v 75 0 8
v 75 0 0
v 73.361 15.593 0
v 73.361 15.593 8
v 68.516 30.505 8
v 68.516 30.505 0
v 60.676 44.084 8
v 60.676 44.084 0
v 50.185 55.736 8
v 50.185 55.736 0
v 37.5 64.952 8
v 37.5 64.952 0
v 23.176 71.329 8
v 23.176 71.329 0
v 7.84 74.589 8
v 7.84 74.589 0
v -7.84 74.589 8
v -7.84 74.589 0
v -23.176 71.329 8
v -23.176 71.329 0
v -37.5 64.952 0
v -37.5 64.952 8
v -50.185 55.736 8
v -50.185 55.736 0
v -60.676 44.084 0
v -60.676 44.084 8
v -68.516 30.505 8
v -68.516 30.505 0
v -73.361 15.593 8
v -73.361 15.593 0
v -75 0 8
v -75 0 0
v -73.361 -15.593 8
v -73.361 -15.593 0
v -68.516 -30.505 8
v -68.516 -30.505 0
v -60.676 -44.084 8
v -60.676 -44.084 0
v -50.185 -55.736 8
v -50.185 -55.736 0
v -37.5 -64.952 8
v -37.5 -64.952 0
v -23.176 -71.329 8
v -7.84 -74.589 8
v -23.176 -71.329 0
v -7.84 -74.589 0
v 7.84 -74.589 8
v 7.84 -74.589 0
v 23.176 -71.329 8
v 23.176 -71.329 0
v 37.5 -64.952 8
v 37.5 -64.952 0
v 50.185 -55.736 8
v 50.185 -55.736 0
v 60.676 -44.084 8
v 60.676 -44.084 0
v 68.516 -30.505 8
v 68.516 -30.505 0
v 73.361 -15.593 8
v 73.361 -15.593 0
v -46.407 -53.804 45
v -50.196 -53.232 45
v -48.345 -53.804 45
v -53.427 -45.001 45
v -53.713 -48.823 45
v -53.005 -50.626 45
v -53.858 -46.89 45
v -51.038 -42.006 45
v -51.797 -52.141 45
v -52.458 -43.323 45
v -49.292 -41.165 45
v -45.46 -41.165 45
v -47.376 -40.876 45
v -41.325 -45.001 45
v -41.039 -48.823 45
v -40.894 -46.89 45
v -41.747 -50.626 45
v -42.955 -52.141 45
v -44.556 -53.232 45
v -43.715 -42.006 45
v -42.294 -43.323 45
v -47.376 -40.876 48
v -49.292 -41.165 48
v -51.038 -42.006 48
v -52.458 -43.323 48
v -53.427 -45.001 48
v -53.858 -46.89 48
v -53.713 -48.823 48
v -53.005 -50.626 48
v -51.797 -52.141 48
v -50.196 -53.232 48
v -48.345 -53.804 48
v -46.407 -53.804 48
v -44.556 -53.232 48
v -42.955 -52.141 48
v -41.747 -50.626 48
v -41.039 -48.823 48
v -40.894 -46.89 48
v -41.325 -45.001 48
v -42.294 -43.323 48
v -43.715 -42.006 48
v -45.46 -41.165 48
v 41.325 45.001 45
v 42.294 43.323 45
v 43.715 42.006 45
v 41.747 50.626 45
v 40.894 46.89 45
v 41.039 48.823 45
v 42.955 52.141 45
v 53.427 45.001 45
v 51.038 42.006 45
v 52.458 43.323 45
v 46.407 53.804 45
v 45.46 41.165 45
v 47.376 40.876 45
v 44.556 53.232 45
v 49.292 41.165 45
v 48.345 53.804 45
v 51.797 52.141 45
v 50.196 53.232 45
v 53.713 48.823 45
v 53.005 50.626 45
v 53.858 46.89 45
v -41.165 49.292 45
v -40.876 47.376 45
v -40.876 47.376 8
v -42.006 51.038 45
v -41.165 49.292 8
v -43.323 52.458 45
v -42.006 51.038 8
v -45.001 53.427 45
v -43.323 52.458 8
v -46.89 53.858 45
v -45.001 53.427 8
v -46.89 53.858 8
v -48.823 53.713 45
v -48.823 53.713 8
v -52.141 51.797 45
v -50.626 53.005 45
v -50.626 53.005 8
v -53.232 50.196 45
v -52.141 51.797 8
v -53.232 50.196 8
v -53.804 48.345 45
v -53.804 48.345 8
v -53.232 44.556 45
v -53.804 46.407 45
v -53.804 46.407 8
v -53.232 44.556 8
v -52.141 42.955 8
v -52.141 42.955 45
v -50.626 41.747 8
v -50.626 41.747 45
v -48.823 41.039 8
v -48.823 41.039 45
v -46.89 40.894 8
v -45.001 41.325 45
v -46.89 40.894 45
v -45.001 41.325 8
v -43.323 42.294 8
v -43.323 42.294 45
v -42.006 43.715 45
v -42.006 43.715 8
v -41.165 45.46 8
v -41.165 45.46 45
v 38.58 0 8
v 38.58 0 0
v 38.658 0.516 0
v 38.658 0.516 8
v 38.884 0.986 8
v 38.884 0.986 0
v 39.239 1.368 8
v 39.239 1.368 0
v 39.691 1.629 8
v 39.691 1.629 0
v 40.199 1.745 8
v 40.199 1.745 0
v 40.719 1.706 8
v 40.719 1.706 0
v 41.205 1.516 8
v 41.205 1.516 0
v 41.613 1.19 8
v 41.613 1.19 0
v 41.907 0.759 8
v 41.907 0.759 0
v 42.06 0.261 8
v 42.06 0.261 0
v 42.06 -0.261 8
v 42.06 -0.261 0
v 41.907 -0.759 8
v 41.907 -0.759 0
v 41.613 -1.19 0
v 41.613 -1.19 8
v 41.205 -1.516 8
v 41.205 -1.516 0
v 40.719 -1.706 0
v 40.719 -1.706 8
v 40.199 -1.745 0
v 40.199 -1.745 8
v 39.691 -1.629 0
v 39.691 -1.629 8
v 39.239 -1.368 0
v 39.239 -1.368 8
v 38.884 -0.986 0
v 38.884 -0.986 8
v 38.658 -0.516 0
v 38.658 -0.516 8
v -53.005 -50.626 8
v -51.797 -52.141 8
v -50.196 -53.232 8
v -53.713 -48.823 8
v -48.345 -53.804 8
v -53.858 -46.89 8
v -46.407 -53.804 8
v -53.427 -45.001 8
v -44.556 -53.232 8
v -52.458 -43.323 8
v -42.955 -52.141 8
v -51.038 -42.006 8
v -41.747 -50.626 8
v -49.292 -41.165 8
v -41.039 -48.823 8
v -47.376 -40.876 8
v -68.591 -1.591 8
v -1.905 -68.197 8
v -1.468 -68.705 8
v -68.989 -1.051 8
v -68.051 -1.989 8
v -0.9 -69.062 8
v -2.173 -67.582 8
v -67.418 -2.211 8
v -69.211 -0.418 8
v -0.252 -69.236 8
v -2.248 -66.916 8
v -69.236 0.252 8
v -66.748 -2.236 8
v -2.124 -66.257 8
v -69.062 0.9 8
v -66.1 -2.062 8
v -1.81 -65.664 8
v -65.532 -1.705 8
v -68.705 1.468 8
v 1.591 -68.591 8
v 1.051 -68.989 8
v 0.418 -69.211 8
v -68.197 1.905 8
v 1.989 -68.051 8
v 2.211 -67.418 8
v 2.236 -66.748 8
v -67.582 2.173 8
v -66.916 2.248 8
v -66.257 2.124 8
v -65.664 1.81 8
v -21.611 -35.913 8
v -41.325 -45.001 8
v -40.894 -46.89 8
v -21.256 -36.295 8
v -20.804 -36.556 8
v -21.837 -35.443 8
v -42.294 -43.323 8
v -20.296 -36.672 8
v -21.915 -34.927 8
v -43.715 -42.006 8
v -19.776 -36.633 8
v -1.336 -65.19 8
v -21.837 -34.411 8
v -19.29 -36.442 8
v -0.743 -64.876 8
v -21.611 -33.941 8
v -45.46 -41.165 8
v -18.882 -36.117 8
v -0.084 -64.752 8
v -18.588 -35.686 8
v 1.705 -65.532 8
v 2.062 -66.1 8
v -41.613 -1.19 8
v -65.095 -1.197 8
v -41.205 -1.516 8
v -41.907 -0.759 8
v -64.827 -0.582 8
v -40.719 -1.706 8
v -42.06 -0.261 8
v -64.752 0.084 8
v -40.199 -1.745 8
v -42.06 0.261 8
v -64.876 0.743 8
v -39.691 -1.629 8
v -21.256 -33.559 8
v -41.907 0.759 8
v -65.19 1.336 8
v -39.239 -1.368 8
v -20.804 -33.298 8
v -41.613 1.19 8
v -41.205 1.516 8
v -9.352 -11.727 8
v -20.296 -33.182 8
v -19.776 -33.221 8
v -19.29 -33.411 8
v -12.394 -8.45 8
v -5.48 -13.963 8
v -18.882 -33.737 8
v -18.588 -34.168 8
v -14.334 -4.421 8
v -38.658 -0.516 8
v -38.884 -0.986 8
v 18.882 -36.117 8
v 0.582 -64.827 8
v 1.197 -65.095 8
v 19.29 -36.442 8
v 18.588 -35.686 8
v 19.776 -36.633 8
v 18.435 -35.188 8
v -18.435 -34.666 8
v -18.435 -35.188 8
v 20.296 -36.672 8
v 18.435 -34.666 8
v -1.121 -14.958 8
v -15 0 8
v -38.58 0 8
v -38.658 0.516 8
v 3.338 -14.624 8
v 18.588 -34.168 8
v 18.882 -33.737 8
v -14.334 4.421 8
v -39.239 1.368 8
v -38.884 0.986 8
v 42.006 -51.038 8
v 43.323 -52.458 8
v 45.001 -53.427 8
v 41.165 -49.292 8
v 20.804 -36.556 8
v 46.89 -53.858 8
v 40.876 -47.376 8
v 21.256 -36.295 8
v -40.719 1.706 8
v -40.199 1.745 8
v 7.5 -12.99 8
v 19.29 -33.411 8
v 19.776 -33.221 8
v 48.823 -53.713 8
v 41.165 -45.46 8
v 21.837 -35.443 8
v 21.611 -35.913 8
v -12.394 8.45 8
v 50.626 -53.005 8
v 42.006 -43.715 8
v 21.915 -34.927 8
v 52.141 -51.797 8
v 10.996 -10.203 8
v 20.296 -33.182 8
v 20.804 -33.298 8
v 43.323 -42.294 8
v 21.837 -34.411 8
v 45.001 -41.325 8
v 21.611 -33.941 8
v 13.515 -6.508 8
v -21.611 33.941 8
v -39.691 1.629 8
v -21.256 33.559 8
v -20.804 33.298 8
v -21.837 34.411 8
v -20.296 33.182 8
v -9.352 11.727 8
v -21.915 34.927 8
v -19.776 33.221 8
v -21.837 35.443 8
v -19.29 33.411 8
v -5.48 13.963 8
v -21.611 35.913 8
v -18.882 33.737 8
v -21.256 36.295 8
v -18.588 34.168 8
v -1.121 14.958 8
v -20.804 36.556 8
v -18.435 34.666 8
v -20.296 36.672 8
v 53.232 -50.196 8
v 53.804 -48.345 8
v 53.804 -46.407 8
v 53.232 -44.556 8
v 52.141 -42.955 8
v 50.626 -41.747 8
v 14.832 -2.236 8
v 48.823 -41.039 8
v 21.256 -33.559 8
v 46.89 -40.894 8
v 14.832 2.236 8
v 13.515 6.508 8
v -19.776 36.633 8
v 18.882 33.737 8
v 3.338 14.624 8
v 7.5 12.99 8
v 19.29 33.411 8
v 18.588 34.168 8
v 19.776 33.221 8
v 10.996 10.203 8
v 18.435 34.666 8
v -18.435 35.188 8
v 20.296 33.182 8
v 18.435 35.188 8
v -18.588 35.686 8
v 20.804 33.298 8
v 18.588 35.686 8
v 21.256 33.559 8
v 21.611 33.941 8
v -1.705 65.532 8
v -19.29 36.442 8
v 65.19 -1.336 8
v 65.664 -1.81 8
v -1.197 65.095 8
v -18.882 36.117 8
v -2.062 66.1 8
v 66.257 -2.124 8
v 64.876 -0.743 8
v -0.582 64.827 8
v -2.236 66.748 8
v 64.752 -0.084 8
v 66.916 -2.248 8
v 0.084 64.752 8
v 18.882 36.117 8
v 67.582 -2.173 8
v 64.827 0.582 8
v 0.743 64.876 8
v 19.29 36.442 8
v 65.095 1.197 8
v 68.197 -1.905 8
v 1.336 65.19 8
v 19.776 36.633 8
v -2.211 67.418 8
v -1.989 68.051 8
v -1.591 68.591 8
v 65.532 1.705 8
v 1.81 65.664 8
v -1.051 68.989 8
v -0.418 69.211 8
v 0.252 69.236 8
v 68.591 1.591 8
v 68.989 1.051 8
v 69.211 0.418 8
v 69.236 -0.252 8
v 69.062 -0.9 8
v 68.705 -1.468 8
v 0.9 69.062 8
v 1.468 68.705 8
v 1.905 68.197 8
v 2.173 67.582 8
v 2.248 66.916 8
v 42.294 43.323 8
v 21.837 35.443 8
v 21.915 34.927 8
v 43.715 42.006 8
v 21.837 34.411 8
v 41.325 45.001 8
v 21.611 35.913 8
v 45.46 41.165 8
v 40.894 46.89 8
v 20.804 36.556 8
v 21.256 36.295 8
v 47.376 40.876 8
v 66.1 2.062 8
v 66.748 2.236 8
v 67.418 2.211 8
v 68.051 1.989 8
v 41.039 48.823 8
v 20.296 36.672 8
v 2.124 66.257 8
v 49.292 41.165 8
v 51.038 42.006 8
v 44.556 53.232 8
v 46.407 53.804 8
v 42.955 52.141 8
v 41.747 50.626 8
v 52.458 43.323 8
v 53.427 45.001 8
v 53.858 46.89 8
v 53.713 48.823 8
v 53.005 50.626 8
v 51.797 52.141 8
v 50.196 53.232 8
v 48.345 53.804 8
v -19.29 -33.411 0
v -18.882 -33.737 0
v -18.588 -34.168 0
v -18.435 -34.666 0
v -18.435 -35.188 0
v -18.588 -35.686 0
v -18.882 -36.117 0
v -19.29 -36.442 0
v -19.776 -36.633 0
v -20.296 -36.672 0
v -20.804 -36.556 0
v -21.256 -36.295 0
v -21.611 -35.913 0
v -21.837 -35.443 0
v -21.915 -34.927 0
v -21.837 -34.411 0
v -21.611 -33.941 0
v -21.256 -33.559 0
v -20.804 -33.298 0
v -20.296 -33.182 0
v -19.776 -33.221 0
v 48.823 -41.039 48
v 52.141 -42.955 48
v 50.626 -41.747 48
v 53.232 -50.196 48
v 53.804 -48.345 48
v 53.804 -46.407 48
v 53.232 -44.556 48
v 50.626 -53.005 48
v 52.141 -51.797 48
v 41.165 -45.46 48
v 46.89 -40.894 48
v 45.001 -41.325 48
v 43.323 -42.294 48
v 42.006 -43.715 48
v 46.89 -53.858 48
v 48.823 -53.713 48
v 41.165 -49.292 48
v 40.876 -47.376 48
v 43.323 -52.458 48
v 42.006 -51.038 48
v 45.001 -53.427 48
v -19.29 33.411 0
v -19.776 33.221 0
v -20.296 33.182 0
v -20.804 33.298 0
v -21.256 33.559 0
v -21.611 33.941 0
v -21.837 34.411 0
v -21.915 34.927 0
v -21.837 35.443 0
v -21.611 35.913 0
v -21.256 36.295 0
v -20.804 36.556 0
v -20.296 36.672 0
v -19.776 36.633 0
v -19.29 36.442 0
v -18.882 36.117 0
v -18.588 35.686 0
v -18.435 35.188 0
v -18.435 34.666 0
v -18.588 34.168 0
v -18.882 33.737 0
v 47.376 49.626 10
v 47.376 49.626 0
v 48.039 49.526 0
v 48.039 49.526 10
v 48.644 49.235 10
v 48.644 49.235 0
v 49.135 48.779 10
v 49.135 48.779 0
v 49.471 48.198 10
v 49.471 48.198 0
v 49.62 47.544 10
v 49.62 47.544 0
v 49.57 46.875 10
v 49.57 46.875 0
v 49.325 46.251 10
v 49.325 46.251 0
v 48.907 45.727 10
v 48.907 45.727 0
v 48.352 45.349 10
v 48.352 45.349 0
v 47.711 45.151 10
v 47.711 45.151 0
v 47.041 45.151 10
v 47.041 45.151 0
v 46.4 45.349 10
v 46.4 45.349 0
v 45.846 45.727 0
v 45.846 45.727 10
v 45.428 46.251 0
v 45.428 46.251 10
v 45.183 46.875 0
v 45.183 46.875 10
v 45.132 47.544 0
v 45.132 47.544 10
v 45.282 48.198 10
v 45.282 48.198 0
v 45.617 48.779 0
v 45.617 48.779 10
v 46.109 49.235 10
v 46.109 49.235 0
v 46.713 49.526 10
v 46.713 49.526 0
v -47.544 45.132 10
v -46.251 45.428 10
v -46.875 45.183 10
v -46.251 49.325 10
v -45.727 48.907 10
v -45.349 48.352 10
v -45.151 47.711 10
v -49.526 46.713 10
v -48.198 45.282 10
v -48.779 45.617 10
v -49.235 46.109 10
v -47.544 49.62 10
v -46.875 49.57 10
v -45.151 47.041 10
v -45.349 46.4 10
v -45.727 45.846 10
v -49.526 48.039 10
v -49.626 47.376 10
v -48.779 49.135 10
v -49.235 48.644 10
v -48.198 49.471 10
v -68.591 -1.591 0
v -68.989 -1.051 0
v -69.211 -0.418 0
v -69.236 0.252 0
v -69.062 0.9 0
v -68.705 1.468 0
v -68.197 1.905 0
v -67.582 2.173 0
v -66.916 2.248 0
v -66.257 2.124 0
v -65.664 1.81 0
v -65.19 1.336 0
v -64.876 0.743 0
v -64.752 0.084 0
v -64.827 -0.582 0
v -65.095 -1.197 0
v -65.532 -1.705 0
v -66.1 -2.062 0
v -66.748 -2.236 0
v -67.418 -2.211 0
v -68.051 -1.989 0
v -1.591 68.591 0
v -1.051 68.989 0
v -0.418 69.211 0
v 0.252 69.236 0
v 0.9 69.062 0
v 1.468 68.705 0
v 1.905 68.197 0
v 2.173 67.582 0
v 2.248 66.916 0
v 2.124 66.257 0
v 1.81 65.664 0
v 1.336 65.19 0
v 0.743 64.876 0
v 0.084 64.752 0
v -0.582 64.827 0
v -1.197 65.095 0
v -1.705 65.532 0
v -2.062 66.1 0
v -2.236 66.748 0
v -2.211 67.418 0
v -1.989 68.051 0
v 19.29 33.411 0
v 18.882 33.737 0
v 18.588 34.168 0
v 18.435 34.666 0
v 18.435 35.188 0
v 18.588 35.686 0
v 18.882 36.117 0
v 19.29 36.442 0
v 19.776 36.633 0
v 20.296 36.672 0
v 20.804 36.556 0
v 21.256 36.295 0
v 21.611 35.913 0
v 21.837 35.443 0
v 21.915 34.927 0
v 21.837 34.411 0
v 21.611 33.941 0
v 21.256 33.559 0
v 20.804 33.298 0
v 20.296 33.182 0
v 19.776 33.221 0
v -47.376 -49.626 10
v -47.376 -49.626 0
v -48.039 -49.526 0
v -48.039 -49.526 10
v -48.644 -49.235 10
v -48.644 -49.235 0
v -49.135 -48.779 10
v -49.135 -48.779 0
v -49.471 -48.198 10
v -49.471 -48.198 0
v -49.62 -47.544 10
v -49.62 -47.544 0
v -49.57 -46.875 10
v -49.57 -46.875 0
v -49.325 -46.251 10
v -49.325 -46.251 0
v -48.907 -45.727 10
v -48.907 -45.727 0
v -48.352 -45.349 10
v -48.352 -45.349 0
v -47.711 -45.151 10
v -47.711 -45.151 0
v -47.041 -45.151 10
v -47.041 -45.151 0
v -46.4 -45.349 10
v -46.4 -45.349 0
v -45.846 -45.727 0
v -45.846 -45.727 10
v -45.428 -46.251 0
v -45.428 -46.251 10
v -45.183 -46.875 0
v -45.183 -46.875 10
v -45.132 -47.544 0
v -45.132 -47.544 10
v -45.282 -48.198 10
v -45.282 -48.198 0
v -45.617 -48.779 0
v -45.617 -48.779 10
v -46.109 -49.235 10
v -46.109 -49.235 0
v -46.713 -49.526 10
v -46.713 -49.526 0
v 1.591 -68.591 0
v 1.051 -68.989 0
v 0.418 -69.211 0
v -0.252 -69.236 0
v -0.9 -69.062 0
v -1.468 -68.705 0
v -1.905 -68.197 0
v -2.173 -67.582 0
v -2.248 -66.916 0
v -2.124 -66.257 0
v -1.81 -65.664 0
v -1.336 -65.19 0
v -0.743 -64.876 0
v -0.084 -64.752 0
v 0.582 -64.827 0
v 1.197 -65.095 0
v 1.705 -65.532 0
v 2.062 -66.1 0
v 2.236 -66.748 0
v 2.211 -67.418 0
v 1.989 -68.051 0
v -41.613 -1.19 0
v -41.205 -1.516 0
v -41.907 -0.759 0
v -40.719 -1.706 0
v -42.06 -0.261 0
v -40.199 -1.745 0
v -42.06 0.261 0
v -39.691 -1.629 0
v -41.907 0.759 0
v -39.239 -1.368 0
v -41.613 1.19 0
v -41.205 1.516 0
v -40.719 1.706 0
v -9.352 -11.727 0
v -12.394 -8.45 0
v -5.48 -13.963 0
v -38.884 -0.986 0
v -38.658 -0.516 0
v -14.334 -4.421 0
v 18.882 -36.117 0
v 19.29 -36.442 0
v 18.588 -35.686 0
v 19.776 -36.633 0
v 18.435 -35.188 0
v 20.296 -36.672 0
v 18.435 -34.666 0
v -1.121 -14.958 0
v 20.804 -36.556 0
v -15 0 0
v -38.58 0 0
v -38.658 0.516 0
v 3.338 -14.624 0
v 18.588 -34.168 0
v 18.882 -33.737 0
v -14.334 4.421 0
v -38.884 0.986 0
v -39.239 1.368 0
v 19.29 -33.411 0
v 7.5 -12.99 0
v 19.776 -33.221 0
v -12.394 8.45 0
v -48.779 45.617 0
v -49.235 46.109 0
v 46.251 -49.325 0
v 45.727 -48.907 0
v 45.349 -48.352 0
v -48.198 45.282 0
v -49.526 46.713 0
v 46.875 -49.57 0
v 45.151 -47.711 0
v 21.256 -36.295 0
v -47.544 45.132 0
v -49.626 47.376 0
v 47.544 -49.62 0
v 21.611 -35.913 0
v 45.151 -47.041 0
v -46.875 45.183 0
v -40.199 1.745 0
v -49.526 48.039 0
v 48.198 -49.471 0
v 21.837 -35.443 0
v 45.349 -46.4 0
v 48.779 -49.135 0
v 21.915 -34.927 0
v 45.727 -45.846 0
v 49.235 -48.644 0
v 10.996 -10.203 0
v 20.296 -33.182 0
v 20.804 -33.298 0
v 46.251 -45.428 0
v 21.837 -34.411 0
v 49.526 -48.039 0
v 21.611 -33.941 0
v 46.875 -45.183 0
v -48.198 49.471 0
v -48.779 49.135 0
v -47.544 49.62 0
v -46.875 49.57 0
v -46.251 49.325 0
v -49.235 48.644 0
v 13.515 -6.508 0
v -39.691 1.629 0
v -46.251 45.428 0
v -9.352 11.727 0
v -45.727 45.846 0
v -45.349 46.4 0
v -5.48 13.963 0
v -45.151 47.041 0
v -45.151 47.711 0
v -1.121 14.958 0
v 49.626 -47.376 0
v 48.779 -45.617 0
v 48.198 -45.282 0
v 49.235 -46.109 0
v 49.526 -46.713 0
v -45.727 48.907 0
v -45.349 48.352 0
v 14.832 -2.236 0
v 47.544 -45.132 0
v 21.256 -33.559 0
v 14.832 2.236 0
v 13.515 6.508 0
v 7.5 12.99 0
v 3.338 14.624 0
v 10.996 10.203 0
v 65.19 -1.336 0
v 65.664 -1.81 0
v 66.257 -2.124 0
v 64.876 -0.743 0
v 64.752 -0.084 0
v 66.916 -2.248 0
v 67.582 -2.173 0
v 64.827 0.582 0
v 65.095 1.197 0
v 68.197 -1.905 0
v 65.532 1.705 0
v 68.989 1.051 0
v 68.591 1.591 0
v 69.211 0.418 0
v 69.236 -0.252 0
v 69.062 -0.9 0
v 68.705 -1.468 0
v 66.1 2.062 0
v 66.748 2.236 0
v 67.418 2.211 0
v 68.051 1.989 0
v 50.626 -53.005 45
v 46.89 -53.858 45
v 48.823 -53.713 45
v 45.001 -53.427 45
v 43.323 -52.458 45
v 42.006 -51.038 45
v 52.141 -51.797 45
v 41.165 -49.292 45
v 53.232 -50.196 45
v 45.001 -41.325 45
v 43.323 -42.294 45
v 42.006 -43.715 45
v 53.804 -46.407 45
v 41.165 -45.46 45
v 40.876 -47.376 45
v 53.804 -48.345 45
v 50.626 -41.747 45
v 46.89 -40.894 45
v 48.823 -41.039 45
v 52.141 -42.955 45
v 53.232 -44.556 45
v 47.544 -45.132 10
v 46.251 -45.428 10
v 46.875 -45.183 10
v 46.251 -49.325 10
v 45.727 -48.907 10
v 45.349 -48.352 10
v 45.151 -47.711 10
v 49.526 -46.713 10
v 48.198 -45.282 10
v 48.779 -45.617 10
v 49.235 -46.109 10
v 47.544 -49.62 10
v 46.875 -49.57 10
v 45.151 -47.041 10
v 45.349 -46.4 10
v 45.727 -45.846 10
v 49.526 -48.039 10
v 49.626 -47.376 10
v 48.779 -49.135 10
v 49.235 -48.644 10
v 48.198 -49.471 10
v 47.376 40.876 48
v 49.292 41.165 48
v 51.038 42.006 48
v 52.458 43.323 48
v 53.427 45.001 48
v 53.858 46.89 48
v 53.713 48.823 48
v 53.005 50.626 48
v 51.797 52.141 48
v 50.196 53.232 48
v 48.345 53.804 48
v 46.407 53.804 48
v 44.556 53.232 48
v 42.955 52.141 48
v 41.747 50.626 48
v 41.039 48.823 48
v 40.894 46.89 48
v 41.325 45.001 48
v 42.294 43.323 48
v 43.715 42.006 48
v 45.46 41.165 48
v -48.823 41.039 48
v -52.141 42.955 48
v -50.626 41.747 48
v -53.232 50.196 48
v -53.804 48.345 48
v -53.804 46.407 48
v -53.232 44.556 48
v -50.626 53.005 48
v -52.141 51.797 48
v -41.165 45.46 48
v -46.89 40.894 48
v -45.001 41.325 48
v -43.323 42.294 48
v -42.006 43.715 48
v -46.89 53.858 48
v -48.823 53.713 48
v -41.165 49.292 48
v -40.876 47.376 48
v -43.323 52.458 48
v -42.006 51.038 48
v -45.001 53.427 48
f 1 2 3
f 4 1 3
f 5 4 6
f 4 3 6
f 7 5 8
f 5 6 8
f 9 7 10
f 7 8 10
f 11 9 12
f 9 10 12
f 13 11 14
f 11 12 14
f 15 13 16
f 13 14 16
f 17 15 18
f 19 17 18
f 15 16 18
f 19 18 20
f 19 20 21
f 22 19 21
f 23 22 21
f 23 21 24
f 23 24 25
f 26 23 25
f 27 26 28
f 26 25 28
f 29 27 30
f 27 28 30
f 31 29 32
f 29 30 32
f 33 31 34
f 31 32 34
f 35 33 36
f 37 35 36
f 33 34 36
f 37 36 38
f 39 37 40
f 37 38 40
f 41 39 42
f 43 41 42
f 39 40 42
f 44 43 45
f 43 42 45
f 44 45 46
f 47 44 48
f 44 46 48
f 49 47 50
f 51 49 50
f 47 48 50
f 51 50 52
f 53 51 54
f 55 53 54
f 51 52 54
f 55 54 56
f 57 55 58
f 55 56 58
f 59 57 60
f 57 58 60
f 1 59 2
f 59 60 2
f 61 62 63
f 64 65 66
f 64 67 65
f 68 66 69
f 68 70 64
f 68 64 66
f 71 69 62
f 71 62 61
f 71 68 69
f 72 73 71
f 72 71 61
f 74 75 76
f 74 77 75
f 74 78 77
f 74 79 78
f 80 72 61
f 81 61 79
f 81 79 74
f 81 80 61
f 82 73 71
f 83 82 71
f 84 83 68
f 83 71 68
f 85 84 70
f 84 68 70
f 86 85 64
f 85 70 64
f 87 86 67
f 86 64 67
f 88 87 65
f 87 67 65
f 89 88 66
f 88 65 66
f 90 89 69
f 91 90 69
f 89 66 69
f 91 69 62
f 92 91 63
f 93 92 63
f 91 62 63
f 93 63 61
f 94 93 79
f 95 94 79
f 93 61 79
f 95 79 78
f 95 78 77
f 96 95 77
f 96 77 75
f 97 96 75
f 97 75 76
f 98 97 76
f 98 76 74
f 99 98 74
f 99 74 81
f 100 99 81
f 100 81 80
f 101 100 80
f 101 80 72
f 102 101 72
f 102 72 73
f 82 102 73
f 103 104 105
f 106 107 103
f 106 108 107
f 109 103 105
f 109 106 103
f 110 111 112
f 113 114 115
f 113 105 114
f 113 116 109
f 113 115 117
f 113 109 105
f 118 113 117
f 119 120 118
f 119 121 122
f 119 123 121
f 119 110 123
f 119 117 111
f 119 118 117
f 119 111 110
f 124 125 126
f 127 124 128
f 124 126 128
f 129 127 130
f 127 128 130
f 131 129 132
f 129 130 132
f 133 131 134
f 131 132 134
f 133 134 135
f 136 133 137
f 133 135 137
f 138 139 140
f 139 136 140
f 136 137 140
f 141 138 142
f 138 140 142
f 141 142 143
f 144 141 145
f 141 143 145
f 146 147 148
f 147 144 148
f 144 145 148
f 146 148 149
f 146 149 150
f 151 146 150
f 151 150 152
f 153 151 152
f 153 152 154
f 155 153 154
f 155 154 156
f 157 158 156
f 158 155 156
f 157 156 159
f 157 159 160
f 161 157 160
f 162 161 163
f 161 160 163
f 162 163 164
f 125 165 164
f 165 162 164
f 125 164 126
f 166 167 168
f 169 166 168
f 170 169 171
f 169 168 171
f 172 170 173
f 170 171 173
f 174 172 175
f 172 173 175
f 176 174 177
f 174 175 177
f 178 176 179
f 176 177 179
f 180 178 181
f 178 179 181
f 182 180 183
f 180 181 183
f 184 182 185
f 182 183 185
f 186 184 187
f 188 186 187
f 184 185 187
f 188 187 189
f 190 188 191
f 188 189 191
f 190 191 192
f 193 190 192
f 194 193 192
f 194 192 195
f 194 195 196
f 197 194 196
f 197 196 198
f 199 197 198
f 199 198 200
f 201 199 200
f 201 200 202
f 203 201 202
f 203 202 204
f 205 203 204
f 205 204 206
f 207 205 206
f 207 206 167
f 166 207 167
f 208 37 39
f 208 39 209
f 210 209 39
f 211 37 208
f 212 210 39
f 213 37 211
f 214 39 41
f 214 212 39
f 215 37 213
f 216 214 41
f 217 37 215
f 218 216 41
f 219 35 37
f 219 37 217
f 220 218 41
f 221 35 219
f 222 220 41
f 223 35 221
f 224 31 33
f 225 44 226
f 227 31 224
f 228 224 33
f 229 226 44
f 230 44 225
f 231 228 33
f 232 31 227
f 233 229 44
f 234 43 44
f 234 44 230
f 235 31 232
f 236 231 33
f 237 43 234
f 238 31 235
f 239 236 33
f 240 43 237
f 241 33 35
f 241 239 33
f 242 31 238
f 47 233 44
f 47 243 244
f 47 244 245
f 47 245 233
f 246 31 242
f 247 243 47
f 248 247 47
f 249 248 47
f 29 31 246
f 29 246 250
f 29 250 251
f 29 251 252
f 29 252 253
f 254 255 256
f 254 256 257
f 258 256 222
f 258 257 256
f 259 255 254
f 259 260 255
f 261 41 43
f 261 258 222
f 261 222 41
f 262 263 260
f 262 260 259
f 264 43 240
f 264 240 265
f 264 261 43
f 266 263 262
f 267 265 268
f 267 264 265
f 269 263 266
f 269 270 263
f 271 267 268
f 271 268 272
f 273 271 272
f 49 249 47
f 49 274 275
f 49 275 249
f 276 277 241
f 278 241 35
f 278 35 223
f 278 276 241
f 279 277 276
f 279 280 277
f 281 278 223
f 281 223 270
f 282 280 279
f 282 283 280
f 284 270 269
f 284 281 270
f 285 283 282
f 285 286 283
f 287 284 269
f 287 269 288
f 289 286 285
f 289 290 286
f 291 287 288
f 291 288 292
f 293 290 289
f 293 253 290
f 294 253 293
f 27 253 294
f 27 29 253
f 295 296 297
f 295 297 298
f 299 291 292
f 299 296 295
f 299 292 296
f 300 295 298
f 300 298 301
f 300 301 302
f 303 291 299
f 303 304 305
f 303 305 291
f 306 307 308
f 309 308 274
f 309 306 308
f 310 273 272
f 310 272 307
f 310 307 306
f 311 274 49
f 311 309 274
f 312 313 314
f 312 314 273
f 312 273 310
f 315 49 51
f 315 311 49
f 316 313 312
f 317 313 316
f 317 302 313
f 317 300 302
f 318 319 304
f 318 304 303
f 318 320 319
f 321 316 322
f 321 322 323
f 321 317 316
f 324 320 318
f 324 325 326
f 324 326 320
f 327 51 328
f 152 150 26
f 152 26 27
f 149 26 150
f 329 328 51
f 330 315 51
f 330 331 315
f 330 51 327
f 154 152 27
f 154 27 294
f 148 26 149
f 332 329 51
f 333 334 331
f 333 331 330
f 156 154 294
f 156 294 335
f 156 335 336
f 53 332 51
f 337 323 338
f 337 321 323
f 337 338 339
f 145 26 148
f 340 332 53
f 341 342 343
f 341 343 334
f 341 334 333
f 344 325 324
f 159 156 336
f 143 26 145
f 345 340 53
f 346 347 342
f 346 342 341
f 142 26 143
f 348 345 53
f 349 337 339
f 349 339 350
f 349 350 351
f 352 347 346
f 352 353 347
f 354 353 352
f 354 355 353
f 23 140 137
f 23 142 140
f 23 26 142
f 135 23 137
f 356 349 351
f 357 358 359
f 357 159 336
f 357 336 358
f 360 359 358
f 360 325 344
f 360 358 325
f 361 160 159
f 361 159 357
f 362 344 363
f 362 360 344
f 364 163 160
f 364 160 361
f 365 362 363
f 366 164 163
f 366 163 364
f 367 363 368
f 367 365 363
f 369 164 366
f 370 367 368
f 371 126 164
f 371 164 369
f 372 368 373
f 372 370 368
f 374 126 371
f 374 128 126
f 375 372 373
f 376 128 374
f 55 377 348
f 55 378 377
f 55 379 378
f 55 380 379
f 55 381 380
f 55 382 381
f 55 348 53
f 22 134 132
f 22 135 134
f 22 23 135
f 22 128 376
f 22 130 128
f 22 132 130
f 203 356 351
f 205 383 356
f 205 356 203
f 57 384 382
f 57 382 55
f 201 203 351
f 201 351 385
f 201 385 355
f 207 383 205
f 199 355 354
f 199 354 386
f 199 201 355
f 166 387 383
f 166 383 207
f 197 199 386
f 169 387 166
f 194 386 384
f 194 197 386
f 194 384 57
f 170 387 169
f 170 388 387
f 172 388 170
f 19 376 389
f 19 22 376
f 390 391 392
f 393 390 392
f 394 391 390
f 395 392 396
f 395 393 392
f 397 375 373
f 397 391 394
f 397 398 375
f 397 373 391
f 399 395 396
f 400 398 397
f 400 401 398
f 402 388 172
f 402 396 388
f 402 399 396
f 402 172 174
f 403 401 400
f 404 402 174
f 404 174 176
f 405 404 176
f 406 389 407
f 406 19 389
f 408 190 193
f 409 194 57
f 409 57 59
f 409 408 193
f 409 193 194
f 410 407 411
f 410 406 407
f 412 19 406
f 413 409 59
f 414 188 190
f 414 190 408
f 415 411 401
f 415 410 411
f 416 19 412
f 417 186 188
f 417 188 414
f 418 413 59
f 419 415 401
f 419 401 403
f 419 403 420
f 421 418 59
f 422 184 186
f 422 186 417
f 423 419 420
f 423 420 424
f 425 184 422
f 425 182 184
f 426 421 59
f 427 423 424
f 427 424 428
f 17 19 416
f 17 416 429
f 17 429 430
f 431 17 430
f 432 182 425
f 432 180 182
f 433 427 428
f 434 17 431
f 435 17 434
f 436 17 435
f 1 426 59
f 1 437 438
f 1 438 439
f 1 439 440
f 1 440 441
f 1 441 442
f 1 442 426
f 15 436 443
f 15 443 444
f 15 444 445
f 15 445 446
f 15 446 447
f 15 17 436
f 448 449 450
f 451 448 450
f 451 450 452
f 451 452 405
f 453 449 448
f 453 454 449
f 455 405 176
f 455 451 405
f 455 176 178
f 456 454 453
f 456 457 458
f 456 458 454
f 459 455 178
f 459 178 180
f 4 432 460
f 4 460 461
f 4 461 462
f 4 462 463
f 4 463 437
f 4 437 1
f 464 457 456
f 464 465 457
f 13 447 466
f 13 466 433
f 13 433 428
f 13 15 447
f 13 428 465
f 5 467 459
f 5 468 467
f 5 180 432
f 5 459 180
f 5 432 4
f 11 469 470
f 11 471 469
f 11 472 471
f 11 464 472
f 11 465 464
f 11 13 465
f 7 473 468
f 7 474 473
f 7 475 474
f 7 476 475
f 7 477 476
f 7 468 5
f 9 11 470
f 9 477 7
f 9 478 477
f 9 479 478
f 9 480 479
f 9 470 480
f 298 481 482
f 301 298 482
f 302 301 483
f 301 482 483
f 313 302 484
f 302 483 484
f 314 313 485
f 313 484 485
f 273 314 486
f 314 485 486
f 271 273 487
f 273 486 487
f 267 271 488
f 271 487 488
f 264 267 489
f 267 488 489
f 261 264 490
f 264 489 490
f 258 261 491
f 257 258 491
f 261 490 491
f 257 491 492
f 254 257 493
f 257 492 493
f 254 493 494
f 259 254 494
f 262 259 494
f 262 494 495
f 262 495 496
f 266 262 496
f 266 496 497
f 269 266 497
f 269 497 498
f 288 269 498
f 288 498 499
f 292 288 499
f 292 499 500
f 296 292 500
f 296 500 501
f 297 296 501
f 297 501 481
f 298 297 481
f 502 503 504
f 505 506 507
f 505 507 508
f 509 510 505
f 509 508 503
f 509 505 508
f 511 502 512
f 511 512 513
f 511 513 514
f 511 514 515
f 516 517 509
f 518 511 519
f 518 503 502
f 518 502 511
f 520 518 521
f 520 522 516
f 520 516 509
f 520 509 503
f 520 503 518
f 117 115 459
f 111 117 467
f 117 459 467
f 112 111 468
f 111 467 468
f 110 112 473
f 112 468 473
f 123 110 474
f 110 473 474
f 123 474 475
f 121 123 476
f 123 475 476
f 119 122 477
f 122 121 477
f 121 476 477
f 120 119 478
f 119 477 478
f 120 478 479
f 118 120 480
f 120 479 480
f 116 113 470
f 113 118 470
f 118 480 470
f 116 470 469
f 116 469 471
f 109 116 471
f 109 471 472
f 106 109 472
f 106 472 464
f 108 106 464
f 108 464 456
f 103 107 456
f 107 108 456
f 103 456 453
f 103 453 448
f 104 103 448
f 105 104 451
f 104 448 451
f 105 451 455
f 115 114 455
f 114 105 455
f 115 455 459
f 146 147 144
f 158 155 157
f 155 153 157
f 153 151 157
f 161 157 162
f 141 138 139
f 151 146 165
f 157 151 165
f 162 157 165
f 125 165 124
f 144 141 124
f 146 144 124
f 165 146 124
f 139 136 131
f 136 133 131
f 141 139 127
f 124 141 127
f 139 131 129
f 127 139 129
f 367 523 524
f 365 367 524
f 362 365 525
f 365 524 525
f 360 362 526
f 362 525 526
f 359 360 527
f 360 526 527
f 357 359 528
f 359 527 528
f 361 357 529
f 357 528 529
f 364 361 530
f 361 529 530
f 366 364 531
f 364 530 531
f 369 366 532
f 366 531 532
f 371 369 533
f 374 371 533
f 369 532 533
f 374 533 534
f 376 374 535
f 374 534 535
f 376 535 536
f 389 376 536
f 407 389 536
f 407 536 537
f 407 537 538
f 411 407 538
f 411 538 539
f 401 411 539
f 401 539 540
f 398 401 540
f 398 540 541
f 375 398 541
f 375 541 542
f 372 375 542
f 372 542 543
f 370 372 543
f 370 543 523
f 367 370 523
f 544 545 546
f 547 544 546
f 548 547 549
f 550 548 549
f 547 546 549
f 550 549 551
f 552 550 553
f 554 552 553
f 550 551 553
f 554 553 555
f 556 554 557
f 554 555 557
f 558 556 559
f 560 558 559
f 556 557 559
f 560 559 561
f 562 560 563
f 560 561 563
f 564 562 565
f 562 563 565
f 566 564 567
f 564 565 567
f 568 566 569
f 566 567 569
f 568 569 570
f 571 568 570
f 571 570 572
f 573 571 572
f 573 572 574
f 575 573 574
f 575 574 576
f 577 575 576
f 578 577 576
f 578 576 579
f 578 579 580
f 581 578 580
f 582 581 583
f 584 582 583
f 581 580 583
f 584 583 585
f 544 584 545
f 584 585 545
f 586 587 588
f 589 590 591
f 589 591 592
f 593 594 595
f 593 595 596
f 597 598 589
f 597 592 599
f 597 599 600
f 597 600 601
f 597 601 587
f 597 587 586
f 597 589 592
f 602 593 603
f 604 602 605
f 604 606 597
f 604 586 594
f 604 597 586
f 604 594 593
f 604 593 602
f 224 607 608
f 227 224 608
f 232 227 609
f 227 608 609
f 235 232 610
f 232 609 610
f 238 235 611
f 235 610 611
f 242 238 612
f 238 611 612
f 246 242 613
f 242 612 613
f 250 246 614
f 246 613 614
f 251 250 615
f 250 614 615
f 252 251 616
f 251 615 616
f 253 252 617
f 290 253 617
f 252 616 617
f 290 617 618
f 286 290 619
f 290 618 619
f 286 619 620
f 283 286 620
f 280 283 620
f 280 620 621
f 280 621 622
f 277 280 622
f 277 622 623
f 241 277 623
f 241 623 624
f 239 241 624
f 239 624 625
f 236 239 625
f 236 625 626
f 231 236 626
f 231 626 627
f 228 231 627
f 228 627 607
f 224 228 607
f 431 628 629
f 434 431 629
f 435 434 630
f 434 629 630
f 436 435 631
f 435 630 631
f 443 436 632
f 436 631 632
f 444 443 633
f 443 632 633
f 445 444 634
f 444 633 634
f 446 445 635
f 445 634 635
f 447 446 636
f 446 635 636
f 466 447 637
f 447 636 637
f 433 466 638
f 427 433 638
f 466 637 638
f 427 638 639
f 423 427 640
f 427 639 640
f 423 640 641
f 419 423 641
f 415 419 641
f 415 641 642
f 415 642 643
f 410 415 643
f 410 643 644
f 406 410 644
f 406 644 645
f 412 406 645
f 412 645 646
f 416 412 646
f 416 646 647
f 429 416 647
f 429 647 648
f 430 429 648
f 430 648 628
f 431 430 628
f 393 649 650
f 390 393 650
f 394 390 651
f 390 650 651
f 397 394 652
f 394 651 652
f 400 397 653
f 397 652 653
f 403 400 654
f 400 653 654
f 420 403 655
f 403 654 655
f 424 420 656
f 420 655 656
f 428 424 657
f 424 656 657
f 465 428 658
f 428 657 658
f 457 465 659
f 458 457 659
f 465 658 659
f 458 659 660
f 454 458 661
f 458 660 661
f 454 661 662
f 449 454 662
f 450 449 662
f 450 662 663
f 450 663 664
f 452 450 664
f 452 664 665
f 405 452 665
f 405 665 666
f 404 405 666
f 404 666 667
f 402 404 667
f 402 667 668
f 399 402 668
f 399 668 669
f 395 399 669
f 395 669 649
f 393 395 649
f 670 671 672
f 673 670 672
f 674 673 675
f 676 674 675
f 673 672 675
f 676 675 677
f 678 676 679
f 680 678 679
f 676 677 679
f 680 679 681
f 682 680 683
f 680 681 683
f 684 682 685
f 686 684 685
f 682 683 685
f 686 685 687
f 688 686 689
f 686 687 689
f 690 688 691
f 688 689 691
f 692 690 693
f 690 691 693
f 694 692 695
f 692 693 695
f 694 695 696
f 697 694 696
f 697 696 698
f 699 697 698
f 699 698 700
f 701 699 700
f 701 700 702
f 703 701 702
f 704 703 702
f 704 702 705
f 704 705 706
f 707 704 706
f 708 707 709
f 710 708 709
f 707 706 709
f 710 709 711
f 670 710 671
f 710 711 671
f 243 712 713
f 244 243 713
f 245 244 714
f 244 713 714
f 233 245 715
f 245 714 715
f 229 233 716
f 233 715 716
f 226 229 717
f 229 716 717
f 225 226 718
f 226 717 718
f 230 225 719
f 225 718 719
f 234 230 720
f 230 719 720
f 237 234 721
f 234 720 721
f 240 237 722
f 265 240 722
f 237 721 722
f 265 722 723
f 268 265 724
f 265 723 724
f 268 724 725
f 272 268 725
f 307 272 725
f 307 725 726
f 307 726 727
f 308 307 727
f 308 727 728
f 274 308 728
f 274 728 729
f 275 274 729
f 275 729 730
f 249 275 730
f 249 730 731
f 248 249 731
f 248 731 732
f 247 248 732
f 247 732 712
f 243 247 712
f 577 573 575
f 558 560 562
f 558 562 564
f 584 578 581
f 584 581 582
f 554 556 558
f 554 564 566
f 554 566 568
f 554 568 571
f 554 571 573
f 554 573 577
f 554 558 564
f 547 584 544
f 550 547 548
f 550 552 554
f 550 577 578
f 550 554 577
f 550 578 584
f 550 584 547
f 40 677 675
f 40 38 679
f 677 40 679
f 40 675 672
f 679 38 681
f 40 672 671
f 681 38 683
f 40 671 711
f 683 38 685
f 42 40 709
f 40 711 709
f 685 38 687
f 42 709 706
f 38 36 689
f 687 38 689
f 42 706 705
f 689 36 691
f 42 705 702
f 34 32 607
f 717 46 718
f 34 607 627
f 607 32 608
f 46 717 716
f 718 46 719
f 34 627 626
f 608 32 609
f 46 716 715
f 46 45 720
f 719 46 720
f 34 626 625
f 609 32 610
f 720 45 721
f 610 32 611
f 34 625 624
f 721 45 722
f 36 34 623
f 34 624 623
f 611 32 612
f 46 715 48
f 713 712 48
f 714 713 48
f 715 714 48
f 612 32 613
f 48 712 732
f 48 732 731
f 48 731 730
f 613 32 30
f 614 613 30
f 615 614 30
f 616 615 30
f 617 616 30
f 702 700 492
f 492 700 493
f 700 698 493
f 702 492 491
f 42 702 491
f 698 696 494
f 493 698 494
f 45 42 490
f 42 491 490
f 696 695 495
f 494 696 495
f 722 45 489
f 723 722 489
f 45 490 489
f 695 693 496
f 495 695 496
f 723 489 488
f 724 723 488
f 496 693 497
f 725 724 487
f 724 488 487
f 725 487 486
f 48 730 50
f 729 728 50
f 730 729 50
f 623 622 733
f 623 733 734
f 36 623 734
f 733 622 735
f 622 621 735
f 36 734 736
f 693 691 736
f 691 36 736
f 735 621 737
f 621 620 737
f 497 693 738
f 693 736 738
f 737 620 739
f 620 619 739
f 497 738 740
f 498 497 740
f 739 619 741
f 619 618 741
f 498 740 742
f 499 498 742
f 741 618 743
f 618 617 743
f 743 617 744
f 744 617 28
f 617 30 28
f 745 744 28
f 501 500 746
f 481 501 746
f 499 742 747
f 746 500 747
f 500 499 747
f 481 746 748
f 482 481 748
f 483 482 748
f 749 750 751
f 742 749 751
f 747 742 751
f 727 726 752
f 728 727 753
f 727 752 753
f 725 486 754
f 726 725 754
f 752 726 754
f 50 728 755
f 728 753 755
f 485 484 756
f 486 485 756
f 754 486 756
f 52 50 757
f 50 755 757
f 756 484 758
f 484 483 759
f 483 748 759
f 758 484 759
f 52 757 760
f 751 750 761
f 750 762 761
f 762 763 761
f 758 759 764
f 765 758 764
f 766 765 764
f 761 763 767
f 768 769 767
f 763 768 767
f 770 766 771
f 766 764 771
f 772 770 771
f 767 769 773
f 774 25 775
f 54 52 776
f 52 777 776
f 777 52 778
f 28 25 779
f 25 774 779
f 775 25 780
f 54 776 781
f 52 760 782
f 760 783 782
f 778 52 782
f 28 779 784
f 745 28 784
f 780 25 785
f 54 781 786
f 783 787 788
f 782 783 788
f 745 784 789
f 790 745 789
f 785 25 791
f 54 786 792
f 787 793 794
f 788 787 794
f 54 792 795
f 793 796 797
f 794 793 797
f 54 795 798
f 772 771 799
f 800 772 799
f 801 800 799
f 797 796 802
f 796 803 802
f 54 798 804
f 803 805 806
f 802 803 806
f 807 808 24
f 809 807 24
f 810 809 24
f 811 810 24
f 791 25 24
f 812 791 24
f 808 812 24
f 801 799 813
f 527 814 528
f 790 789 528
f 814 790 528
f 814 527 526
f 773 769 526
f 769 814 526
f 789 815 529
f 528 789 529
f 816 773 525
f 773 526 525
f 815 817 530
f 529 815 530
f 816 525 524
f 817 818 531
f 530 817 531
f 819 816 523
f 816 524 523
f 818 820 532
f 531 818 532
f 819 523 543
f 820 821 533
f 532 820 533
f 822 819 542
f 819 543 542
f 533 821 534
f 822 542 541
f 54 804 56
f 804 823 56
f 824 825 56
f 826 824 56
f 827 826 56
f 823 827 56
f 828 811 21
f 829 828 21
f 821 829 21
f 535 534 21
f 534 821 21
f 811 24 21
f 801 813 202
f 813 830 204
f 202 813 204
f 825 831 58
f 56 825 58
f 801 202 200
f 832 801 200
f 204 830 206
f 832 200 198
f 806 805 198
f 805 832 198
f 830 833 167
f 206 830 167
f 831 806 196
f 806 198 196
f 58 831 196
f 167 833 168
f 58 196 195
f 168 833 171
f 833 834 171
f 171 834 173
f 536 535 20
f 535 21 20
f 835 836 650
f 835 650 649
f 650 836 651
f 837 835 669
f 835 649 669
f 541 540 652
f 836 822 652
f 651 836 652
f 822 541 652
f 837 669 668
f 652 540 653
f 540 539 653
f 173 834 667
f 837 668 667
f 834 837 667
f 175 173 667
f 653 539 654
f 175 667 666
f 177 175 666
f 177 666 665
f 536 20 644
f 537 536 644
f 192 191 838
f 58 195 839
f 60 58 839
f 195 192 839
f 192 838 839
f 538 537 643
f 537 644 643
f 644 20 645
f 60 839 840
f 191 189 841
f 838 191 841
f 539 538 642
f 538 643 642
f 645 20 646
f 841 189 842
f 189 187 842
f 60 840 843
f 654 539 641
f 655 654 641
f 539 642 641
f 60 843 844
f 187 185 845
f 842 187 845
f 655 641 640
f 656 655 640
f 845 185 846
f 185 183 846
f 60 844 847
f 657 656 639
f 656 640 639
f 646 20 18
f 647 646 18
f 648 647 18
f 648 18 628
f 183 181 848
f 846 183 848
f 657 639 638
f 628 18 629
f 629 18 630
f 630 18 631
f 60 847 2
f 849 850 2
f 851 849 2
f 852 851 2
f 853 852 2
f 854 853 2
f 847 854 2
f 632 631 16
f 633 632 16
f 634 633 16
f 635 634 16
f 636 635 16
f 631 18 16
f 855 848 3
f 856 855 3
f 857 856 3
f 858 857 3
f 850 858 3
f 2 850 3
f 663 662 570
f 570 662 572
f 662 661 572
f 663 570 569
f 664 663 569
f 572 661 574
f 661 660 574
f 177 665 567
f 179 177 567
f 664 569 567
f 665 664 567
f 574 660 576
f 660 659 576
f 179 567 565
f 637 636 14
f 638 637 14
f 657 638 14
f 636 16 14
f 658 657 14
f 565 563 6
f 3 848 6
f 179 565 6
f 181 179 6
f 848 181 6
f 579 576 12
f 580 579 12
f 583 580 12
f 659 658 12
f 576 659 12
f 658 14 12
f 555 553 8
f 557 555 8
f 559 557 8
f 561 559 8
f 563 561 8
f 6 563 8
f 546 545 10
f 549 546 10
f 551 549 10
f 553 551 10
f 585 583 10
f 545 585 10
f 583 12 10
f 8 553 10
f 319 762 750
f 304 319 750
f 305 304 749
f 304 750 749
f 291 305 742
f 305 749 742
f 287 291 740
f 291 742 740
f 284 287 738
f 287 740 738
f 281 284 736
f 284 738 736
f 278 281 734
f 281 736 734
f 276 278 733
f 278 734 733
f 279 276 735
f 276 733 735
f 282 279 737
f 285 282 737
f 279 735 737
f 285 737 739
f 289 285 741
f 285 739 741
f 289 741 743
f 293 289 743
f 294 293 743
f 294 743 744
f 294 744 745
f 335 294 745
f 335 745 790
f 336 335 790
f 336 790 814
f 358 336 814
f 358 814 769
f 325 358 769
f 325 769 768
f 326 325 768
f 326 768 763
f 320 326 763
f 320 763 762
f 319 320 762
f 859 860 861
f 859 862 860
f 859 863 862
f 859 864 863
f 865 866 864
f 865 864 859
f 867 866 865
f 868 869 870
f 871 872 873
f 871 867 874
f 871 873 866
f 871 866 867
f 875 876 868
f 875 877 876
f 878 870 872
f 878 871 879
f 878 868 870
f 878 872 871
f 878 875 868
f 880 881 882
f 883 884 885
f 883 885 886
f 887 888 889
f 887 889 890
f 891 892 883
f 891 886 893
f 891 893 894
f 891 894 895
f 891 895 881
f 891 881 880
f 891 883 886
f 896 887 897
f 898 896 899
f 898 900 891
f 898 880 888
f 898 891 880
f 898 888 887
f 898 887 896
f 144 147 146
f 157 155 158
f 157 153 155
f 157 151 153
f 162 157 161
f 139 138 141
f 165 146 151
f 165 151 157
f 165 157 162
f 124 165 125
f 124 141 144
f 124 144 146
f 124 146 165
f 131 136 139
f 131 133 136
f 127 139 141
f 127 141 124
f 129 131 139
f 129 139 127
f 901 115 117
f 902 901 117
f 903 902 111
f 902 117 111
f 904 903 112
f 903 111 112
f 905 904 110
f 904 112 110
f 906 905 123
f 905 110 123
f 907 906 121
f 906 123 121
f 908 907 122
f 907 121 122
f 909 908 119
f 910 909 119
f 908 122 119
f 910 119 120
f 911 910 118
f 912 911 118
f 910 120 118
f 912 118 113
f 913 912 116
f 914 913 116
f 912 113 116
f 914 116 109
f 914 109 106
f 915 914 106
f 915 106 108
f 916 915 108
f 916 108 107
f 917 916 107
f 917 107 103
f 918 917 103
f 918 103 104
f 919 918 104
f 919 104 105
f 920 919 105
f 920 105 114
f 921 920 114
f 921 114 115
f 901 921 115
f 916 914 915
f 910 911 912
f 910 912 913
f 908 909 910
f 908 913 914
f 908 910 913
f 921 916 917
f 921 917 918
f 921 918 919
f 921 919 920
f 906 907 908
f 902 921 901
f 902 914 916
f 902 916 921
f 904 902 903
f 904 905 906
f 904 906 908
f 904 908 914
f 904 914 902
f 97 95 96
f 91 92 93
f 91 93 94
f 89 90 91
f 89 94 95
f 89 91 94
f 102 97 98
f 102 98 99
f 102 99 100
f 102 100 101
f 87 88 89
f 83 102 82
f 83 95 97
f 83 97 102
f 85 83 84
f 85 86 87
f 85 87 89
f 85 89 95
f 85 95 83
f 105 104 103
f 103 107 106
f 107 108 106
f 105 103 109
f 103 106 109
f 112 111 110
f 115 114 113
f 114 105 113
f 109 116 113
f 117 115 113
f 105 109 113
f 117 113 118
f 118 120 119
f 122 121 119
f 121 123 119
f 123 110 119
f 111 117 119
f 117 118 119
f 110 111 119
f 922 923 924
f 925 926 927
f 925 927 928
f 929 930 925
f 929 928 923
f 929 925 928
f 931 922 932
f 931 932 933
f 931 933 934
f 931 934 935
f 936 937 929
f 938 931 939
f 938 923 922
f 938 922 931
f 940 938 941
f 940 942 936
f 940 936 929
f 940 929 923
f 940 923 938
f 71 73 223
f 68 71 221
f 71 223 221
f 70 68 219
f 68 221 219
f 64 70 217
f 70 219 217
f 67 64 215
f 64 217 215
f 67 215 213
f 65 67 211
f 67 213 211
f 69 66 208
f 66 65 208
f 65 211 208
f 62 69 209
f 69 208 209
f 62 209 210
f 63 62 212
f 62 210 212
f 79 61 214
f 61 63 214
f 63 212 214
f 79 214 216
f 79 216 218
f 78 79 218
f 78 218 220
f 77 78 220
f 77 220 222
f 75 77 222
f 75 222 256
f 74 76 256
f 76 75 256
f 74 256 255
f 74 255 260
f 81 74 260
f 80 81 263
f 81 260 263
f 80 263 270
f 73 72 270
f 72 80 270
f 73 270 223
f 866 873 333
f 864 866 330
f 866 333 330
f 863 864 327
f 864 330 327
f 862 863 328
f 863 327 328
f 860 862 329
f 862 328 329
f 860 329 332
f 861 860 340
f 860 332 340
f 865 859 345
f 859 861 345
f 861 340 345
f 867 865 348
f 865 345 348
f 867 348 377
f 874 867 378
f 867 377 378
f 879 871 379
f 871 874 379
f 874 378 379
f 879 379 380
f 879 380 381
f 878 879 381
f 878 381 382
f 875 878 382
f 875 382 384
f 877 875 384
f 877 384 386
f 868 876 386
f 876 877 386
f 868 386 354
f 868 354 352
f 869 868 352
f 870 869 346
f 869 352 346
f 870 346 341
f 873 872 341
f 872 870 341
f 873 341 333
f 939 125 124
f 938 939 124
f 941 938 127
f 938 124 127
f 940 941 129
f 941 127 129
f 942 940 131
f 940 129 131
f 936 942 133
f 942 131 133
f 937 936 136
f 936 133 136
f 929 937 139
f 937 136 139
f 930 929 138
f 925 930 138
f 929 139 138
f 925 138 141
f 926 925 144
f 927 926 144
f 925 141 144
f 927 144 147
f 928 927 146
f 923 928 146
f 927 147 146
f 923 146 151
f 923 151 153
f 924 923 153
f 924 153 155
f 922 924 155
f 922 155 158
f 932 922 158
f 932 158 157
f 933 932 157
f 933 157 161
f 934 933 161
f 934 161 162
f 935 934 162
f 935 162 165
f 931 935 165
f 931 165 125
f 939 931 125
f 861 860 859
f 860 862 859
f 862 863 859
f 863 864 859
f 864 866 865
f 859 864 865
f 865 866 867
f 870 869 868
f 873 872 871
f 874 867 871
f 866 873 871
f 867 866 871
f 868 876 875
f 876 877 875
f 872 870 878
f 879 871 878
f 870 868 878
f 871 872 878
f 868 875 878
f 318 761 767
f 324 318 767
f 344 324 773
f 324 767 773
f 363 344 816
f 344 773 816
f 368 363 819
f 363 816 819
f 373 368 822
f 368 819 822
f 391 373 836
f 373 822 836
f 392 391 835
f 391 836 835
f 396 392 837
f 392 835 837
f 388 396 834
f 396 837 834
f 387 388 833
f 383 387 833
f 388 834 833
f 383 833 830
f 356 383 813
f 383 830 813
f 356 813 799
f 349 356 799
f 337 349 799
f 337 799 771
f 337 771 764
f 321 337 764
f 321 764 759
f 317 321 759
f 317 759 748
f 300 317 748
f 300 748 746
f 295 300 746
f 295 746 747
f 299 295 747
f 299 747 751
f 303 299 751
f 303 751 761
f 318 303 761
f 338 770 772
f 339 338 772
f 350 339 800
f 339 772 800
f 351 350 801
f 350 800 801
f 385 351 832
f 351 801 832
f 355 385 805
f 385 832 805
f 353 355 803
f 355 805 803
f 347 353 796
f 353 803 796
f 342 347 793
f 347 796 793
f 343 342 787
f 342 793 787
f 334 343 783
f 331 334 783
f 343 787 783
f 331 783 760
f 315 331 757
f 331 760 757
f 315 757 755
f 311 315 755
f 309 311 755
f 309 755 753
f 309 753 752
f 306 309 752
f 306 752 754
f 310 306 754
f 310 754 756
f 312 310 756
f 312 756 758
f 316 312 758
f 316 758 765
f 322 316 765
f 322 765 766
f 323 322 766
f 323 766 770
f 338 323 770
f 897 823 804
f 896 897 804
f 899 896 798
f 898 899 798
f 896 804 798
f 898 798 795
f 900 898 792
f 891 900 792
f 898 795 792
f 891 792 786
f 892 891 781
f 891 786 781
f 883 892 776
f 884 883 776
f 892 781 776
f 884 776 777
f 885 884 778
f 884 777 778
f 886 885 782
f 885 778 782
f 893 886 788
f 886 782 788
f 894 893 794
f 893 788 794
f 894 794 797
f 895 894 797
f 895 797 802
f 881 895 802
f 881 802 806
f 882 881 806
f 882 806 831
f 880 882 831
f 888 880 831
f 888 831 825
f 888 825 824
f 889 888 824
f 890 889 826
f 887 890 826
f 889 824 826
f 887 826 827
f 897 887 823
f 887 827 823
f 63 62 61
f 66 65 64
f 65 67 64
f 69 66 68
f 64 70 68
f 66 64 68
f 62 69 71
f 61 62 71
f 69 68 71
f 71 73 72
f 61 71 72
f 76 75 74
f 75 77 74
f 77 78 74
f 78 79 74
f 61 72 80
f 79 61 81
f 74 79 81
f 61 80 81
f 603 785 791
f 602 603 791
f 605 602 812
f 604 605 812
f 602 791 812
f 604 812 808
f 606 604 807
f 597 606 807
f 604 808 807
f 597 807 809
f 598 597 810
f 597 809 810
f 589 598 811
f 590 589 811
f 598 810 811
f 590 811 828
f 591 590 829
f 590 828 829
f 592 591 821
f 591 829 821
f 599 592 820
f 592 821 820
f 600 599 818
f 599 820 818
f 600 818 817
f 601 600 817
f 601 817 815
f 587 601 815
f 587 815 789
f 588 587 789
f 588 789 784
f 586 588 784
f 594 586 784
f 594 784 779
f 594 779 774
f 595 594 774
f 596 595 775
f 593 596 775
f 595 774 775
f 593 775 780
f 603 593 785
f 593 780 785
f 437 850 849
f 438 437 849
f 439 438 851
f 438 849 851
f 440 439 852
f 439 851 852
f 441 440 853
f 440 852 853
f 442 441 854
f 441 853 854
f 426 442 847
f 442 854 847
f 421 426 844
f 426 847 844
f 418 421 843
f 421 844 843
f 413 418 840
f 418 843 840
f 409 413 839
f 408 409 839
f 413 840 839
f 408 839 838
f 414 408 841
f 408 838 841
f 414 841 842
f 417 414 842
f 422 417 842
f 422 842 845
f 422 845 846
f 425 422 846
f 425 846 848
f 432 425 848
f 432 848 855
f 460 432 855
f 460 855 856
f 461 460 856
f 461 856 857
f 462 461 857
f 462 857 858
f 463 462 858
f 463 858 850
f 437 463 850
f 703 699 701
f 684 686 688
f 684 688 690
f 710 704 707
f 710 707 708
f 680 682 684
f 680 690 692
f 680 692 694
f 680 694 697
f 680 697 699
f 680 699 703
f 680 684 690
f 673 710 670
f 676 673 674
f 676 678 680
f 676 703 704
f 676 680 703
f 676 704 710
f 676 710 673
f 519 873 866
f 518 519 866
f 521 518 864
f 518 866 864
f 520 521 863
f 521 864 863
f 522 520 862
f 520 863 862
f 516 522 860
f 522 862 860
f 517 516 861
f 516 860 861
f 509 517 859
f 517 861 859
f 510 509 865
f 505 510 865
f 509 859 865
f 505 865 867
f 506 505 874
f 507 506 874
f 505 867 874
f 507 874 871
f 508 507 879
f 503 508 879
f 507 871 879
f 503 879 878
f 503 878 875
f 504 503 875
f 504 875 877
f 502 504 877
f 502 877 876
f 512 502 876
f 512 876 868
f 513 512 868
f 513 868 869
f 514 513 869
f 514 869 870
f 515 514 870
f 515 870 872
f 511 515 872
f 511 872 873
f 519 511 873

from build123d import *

# Parameters (mm, degrees)
SKETCH1_R           = 75
BOSS_EXTRUDE1_DEPTH = 8
SKETCH2_R           = 6.5
BOSS_EXTRUDE2_DEPTH = 40
CIRPATTERN1_COUNT   = 4
SKETCH3_R           = 15
CUT_EXTRUDE1_DEPTH  = 117.421647472
SKETCH4_R           = 2.25
CUT_EXTRUDE2_DEPTH  = 10
CIRPATTERN2_COUNT   = 8
SKETCH5_R           = 1.75
CUT_EXTRUDE3_DEPTH  = 117.421647472
CIRPATTERN3_COUNT   = 6


with BuildPart() as part:
    # Sketch1 → Boss-Extrude1 (new body)
    with BuildSketch(Plane.XY):
        Circle(SKETCH1_R)
    extrude(amount=BOSS_EXTRUDE1_DEPTH)

    # Sketch2 → Boss-Extrude2 (add)
    with BuildSketch(Plane.XY.offset(8)):
        with Locations((-47.376154339, 47.376154339)):
            Circle(SKETCH2_R)
    boss_extrude2 = extrude(amount=BOSS_EXTRUDE2_DEPTH)

    # CirPattern1: Boss-Extrude2 ×4 about axis
    cirpattern1_axis = Axis((0, 0, 0), (0, 0, 1))
    for i in range(1, CIRPATTERN1_COUNT):
        add(boss_extrude2.rotate(cirpattern1_axis, i * 360 / CIRPATTERN1_COUNT))


with BuildPart() as body_2:
    # Split1: the piece on the far side of the plane
    add(part.part)
    split(bisect_by=Plane.XY.offset(45), keep=Keep.BOTTOM)

    # Sketch3 → Cut-Extrude1 (cut, through all)
    with BuildSketch(Plane(origin=(0, 0, 0), x_dir=(-1, 0, 0), z_dir=(0, 0, -1))):
        Circle(SKETCH3_R)
    extrude(amount=-CUT_EXTRUDE1_DEPTH, mode=Mode.SUBTRACT)

    # Sketch4 → Cut-Extrude2 (cut)
    with BuildSketch(Plane(origin=(0, 0, 0), x_dir=(-1, 0, 0), z_dir=(0, 0, -1))):
        with Locations((47.376154339, 47.376154339)):
            Circle(SKETCH4_R)
    cut_extrude2 = extrude(amount=-CUT_EXTRUDE2_DEPTH, mode=Mode.SUBTRACT)

    # CirPattern2: Cut-Extrude2 ×8 about axis
    cirpattern2_axis = Axis((0, 0, 0), (0, 0, 1))
    for i in range(1, CIRPATTERN2_COUNT):
        add(cut_extrude2.rotate(cirpattern2_axis, i * 360 / CIRPATTERN2_COUNT), mode=Mode.SUBTRACT)

    # Sketch5 → Cut-Extrude3 (cut, through all)
    with BuildSketch(Plane(origin=(0, 0, 0), x_dir=(-1, 0, 0), z_dir=(0, 0, -1))):
        with Locations((-40.33, 0)):
            Circle(SKETCH5_R)
    cut_extrude3 = extrude(amount=-CUT_EXTRUDE3_DEPTH, mode=Mode.SUBTRACT)

    # CirPattern3: Cut-Extrude3 ×6 about axis
    cirpattern3_axis = Axis((0, 0, 0), (0, 0, 1))
    for i in range(1, CIRPATTERN3_COUNT):
        add(cut_extrude3.rotate(cirpattern3_axis, i * 360 / CIRPATTERN3_COUNT), mode=Mode.SUBTRACT)


with BuildPart() as part_1:
    add(part.part)

    # Split1
    split(bisect_by=Plane.XY.offset(45), keep=Keep.TOP)


solid = Compound([body_2.part, part_1.part])
